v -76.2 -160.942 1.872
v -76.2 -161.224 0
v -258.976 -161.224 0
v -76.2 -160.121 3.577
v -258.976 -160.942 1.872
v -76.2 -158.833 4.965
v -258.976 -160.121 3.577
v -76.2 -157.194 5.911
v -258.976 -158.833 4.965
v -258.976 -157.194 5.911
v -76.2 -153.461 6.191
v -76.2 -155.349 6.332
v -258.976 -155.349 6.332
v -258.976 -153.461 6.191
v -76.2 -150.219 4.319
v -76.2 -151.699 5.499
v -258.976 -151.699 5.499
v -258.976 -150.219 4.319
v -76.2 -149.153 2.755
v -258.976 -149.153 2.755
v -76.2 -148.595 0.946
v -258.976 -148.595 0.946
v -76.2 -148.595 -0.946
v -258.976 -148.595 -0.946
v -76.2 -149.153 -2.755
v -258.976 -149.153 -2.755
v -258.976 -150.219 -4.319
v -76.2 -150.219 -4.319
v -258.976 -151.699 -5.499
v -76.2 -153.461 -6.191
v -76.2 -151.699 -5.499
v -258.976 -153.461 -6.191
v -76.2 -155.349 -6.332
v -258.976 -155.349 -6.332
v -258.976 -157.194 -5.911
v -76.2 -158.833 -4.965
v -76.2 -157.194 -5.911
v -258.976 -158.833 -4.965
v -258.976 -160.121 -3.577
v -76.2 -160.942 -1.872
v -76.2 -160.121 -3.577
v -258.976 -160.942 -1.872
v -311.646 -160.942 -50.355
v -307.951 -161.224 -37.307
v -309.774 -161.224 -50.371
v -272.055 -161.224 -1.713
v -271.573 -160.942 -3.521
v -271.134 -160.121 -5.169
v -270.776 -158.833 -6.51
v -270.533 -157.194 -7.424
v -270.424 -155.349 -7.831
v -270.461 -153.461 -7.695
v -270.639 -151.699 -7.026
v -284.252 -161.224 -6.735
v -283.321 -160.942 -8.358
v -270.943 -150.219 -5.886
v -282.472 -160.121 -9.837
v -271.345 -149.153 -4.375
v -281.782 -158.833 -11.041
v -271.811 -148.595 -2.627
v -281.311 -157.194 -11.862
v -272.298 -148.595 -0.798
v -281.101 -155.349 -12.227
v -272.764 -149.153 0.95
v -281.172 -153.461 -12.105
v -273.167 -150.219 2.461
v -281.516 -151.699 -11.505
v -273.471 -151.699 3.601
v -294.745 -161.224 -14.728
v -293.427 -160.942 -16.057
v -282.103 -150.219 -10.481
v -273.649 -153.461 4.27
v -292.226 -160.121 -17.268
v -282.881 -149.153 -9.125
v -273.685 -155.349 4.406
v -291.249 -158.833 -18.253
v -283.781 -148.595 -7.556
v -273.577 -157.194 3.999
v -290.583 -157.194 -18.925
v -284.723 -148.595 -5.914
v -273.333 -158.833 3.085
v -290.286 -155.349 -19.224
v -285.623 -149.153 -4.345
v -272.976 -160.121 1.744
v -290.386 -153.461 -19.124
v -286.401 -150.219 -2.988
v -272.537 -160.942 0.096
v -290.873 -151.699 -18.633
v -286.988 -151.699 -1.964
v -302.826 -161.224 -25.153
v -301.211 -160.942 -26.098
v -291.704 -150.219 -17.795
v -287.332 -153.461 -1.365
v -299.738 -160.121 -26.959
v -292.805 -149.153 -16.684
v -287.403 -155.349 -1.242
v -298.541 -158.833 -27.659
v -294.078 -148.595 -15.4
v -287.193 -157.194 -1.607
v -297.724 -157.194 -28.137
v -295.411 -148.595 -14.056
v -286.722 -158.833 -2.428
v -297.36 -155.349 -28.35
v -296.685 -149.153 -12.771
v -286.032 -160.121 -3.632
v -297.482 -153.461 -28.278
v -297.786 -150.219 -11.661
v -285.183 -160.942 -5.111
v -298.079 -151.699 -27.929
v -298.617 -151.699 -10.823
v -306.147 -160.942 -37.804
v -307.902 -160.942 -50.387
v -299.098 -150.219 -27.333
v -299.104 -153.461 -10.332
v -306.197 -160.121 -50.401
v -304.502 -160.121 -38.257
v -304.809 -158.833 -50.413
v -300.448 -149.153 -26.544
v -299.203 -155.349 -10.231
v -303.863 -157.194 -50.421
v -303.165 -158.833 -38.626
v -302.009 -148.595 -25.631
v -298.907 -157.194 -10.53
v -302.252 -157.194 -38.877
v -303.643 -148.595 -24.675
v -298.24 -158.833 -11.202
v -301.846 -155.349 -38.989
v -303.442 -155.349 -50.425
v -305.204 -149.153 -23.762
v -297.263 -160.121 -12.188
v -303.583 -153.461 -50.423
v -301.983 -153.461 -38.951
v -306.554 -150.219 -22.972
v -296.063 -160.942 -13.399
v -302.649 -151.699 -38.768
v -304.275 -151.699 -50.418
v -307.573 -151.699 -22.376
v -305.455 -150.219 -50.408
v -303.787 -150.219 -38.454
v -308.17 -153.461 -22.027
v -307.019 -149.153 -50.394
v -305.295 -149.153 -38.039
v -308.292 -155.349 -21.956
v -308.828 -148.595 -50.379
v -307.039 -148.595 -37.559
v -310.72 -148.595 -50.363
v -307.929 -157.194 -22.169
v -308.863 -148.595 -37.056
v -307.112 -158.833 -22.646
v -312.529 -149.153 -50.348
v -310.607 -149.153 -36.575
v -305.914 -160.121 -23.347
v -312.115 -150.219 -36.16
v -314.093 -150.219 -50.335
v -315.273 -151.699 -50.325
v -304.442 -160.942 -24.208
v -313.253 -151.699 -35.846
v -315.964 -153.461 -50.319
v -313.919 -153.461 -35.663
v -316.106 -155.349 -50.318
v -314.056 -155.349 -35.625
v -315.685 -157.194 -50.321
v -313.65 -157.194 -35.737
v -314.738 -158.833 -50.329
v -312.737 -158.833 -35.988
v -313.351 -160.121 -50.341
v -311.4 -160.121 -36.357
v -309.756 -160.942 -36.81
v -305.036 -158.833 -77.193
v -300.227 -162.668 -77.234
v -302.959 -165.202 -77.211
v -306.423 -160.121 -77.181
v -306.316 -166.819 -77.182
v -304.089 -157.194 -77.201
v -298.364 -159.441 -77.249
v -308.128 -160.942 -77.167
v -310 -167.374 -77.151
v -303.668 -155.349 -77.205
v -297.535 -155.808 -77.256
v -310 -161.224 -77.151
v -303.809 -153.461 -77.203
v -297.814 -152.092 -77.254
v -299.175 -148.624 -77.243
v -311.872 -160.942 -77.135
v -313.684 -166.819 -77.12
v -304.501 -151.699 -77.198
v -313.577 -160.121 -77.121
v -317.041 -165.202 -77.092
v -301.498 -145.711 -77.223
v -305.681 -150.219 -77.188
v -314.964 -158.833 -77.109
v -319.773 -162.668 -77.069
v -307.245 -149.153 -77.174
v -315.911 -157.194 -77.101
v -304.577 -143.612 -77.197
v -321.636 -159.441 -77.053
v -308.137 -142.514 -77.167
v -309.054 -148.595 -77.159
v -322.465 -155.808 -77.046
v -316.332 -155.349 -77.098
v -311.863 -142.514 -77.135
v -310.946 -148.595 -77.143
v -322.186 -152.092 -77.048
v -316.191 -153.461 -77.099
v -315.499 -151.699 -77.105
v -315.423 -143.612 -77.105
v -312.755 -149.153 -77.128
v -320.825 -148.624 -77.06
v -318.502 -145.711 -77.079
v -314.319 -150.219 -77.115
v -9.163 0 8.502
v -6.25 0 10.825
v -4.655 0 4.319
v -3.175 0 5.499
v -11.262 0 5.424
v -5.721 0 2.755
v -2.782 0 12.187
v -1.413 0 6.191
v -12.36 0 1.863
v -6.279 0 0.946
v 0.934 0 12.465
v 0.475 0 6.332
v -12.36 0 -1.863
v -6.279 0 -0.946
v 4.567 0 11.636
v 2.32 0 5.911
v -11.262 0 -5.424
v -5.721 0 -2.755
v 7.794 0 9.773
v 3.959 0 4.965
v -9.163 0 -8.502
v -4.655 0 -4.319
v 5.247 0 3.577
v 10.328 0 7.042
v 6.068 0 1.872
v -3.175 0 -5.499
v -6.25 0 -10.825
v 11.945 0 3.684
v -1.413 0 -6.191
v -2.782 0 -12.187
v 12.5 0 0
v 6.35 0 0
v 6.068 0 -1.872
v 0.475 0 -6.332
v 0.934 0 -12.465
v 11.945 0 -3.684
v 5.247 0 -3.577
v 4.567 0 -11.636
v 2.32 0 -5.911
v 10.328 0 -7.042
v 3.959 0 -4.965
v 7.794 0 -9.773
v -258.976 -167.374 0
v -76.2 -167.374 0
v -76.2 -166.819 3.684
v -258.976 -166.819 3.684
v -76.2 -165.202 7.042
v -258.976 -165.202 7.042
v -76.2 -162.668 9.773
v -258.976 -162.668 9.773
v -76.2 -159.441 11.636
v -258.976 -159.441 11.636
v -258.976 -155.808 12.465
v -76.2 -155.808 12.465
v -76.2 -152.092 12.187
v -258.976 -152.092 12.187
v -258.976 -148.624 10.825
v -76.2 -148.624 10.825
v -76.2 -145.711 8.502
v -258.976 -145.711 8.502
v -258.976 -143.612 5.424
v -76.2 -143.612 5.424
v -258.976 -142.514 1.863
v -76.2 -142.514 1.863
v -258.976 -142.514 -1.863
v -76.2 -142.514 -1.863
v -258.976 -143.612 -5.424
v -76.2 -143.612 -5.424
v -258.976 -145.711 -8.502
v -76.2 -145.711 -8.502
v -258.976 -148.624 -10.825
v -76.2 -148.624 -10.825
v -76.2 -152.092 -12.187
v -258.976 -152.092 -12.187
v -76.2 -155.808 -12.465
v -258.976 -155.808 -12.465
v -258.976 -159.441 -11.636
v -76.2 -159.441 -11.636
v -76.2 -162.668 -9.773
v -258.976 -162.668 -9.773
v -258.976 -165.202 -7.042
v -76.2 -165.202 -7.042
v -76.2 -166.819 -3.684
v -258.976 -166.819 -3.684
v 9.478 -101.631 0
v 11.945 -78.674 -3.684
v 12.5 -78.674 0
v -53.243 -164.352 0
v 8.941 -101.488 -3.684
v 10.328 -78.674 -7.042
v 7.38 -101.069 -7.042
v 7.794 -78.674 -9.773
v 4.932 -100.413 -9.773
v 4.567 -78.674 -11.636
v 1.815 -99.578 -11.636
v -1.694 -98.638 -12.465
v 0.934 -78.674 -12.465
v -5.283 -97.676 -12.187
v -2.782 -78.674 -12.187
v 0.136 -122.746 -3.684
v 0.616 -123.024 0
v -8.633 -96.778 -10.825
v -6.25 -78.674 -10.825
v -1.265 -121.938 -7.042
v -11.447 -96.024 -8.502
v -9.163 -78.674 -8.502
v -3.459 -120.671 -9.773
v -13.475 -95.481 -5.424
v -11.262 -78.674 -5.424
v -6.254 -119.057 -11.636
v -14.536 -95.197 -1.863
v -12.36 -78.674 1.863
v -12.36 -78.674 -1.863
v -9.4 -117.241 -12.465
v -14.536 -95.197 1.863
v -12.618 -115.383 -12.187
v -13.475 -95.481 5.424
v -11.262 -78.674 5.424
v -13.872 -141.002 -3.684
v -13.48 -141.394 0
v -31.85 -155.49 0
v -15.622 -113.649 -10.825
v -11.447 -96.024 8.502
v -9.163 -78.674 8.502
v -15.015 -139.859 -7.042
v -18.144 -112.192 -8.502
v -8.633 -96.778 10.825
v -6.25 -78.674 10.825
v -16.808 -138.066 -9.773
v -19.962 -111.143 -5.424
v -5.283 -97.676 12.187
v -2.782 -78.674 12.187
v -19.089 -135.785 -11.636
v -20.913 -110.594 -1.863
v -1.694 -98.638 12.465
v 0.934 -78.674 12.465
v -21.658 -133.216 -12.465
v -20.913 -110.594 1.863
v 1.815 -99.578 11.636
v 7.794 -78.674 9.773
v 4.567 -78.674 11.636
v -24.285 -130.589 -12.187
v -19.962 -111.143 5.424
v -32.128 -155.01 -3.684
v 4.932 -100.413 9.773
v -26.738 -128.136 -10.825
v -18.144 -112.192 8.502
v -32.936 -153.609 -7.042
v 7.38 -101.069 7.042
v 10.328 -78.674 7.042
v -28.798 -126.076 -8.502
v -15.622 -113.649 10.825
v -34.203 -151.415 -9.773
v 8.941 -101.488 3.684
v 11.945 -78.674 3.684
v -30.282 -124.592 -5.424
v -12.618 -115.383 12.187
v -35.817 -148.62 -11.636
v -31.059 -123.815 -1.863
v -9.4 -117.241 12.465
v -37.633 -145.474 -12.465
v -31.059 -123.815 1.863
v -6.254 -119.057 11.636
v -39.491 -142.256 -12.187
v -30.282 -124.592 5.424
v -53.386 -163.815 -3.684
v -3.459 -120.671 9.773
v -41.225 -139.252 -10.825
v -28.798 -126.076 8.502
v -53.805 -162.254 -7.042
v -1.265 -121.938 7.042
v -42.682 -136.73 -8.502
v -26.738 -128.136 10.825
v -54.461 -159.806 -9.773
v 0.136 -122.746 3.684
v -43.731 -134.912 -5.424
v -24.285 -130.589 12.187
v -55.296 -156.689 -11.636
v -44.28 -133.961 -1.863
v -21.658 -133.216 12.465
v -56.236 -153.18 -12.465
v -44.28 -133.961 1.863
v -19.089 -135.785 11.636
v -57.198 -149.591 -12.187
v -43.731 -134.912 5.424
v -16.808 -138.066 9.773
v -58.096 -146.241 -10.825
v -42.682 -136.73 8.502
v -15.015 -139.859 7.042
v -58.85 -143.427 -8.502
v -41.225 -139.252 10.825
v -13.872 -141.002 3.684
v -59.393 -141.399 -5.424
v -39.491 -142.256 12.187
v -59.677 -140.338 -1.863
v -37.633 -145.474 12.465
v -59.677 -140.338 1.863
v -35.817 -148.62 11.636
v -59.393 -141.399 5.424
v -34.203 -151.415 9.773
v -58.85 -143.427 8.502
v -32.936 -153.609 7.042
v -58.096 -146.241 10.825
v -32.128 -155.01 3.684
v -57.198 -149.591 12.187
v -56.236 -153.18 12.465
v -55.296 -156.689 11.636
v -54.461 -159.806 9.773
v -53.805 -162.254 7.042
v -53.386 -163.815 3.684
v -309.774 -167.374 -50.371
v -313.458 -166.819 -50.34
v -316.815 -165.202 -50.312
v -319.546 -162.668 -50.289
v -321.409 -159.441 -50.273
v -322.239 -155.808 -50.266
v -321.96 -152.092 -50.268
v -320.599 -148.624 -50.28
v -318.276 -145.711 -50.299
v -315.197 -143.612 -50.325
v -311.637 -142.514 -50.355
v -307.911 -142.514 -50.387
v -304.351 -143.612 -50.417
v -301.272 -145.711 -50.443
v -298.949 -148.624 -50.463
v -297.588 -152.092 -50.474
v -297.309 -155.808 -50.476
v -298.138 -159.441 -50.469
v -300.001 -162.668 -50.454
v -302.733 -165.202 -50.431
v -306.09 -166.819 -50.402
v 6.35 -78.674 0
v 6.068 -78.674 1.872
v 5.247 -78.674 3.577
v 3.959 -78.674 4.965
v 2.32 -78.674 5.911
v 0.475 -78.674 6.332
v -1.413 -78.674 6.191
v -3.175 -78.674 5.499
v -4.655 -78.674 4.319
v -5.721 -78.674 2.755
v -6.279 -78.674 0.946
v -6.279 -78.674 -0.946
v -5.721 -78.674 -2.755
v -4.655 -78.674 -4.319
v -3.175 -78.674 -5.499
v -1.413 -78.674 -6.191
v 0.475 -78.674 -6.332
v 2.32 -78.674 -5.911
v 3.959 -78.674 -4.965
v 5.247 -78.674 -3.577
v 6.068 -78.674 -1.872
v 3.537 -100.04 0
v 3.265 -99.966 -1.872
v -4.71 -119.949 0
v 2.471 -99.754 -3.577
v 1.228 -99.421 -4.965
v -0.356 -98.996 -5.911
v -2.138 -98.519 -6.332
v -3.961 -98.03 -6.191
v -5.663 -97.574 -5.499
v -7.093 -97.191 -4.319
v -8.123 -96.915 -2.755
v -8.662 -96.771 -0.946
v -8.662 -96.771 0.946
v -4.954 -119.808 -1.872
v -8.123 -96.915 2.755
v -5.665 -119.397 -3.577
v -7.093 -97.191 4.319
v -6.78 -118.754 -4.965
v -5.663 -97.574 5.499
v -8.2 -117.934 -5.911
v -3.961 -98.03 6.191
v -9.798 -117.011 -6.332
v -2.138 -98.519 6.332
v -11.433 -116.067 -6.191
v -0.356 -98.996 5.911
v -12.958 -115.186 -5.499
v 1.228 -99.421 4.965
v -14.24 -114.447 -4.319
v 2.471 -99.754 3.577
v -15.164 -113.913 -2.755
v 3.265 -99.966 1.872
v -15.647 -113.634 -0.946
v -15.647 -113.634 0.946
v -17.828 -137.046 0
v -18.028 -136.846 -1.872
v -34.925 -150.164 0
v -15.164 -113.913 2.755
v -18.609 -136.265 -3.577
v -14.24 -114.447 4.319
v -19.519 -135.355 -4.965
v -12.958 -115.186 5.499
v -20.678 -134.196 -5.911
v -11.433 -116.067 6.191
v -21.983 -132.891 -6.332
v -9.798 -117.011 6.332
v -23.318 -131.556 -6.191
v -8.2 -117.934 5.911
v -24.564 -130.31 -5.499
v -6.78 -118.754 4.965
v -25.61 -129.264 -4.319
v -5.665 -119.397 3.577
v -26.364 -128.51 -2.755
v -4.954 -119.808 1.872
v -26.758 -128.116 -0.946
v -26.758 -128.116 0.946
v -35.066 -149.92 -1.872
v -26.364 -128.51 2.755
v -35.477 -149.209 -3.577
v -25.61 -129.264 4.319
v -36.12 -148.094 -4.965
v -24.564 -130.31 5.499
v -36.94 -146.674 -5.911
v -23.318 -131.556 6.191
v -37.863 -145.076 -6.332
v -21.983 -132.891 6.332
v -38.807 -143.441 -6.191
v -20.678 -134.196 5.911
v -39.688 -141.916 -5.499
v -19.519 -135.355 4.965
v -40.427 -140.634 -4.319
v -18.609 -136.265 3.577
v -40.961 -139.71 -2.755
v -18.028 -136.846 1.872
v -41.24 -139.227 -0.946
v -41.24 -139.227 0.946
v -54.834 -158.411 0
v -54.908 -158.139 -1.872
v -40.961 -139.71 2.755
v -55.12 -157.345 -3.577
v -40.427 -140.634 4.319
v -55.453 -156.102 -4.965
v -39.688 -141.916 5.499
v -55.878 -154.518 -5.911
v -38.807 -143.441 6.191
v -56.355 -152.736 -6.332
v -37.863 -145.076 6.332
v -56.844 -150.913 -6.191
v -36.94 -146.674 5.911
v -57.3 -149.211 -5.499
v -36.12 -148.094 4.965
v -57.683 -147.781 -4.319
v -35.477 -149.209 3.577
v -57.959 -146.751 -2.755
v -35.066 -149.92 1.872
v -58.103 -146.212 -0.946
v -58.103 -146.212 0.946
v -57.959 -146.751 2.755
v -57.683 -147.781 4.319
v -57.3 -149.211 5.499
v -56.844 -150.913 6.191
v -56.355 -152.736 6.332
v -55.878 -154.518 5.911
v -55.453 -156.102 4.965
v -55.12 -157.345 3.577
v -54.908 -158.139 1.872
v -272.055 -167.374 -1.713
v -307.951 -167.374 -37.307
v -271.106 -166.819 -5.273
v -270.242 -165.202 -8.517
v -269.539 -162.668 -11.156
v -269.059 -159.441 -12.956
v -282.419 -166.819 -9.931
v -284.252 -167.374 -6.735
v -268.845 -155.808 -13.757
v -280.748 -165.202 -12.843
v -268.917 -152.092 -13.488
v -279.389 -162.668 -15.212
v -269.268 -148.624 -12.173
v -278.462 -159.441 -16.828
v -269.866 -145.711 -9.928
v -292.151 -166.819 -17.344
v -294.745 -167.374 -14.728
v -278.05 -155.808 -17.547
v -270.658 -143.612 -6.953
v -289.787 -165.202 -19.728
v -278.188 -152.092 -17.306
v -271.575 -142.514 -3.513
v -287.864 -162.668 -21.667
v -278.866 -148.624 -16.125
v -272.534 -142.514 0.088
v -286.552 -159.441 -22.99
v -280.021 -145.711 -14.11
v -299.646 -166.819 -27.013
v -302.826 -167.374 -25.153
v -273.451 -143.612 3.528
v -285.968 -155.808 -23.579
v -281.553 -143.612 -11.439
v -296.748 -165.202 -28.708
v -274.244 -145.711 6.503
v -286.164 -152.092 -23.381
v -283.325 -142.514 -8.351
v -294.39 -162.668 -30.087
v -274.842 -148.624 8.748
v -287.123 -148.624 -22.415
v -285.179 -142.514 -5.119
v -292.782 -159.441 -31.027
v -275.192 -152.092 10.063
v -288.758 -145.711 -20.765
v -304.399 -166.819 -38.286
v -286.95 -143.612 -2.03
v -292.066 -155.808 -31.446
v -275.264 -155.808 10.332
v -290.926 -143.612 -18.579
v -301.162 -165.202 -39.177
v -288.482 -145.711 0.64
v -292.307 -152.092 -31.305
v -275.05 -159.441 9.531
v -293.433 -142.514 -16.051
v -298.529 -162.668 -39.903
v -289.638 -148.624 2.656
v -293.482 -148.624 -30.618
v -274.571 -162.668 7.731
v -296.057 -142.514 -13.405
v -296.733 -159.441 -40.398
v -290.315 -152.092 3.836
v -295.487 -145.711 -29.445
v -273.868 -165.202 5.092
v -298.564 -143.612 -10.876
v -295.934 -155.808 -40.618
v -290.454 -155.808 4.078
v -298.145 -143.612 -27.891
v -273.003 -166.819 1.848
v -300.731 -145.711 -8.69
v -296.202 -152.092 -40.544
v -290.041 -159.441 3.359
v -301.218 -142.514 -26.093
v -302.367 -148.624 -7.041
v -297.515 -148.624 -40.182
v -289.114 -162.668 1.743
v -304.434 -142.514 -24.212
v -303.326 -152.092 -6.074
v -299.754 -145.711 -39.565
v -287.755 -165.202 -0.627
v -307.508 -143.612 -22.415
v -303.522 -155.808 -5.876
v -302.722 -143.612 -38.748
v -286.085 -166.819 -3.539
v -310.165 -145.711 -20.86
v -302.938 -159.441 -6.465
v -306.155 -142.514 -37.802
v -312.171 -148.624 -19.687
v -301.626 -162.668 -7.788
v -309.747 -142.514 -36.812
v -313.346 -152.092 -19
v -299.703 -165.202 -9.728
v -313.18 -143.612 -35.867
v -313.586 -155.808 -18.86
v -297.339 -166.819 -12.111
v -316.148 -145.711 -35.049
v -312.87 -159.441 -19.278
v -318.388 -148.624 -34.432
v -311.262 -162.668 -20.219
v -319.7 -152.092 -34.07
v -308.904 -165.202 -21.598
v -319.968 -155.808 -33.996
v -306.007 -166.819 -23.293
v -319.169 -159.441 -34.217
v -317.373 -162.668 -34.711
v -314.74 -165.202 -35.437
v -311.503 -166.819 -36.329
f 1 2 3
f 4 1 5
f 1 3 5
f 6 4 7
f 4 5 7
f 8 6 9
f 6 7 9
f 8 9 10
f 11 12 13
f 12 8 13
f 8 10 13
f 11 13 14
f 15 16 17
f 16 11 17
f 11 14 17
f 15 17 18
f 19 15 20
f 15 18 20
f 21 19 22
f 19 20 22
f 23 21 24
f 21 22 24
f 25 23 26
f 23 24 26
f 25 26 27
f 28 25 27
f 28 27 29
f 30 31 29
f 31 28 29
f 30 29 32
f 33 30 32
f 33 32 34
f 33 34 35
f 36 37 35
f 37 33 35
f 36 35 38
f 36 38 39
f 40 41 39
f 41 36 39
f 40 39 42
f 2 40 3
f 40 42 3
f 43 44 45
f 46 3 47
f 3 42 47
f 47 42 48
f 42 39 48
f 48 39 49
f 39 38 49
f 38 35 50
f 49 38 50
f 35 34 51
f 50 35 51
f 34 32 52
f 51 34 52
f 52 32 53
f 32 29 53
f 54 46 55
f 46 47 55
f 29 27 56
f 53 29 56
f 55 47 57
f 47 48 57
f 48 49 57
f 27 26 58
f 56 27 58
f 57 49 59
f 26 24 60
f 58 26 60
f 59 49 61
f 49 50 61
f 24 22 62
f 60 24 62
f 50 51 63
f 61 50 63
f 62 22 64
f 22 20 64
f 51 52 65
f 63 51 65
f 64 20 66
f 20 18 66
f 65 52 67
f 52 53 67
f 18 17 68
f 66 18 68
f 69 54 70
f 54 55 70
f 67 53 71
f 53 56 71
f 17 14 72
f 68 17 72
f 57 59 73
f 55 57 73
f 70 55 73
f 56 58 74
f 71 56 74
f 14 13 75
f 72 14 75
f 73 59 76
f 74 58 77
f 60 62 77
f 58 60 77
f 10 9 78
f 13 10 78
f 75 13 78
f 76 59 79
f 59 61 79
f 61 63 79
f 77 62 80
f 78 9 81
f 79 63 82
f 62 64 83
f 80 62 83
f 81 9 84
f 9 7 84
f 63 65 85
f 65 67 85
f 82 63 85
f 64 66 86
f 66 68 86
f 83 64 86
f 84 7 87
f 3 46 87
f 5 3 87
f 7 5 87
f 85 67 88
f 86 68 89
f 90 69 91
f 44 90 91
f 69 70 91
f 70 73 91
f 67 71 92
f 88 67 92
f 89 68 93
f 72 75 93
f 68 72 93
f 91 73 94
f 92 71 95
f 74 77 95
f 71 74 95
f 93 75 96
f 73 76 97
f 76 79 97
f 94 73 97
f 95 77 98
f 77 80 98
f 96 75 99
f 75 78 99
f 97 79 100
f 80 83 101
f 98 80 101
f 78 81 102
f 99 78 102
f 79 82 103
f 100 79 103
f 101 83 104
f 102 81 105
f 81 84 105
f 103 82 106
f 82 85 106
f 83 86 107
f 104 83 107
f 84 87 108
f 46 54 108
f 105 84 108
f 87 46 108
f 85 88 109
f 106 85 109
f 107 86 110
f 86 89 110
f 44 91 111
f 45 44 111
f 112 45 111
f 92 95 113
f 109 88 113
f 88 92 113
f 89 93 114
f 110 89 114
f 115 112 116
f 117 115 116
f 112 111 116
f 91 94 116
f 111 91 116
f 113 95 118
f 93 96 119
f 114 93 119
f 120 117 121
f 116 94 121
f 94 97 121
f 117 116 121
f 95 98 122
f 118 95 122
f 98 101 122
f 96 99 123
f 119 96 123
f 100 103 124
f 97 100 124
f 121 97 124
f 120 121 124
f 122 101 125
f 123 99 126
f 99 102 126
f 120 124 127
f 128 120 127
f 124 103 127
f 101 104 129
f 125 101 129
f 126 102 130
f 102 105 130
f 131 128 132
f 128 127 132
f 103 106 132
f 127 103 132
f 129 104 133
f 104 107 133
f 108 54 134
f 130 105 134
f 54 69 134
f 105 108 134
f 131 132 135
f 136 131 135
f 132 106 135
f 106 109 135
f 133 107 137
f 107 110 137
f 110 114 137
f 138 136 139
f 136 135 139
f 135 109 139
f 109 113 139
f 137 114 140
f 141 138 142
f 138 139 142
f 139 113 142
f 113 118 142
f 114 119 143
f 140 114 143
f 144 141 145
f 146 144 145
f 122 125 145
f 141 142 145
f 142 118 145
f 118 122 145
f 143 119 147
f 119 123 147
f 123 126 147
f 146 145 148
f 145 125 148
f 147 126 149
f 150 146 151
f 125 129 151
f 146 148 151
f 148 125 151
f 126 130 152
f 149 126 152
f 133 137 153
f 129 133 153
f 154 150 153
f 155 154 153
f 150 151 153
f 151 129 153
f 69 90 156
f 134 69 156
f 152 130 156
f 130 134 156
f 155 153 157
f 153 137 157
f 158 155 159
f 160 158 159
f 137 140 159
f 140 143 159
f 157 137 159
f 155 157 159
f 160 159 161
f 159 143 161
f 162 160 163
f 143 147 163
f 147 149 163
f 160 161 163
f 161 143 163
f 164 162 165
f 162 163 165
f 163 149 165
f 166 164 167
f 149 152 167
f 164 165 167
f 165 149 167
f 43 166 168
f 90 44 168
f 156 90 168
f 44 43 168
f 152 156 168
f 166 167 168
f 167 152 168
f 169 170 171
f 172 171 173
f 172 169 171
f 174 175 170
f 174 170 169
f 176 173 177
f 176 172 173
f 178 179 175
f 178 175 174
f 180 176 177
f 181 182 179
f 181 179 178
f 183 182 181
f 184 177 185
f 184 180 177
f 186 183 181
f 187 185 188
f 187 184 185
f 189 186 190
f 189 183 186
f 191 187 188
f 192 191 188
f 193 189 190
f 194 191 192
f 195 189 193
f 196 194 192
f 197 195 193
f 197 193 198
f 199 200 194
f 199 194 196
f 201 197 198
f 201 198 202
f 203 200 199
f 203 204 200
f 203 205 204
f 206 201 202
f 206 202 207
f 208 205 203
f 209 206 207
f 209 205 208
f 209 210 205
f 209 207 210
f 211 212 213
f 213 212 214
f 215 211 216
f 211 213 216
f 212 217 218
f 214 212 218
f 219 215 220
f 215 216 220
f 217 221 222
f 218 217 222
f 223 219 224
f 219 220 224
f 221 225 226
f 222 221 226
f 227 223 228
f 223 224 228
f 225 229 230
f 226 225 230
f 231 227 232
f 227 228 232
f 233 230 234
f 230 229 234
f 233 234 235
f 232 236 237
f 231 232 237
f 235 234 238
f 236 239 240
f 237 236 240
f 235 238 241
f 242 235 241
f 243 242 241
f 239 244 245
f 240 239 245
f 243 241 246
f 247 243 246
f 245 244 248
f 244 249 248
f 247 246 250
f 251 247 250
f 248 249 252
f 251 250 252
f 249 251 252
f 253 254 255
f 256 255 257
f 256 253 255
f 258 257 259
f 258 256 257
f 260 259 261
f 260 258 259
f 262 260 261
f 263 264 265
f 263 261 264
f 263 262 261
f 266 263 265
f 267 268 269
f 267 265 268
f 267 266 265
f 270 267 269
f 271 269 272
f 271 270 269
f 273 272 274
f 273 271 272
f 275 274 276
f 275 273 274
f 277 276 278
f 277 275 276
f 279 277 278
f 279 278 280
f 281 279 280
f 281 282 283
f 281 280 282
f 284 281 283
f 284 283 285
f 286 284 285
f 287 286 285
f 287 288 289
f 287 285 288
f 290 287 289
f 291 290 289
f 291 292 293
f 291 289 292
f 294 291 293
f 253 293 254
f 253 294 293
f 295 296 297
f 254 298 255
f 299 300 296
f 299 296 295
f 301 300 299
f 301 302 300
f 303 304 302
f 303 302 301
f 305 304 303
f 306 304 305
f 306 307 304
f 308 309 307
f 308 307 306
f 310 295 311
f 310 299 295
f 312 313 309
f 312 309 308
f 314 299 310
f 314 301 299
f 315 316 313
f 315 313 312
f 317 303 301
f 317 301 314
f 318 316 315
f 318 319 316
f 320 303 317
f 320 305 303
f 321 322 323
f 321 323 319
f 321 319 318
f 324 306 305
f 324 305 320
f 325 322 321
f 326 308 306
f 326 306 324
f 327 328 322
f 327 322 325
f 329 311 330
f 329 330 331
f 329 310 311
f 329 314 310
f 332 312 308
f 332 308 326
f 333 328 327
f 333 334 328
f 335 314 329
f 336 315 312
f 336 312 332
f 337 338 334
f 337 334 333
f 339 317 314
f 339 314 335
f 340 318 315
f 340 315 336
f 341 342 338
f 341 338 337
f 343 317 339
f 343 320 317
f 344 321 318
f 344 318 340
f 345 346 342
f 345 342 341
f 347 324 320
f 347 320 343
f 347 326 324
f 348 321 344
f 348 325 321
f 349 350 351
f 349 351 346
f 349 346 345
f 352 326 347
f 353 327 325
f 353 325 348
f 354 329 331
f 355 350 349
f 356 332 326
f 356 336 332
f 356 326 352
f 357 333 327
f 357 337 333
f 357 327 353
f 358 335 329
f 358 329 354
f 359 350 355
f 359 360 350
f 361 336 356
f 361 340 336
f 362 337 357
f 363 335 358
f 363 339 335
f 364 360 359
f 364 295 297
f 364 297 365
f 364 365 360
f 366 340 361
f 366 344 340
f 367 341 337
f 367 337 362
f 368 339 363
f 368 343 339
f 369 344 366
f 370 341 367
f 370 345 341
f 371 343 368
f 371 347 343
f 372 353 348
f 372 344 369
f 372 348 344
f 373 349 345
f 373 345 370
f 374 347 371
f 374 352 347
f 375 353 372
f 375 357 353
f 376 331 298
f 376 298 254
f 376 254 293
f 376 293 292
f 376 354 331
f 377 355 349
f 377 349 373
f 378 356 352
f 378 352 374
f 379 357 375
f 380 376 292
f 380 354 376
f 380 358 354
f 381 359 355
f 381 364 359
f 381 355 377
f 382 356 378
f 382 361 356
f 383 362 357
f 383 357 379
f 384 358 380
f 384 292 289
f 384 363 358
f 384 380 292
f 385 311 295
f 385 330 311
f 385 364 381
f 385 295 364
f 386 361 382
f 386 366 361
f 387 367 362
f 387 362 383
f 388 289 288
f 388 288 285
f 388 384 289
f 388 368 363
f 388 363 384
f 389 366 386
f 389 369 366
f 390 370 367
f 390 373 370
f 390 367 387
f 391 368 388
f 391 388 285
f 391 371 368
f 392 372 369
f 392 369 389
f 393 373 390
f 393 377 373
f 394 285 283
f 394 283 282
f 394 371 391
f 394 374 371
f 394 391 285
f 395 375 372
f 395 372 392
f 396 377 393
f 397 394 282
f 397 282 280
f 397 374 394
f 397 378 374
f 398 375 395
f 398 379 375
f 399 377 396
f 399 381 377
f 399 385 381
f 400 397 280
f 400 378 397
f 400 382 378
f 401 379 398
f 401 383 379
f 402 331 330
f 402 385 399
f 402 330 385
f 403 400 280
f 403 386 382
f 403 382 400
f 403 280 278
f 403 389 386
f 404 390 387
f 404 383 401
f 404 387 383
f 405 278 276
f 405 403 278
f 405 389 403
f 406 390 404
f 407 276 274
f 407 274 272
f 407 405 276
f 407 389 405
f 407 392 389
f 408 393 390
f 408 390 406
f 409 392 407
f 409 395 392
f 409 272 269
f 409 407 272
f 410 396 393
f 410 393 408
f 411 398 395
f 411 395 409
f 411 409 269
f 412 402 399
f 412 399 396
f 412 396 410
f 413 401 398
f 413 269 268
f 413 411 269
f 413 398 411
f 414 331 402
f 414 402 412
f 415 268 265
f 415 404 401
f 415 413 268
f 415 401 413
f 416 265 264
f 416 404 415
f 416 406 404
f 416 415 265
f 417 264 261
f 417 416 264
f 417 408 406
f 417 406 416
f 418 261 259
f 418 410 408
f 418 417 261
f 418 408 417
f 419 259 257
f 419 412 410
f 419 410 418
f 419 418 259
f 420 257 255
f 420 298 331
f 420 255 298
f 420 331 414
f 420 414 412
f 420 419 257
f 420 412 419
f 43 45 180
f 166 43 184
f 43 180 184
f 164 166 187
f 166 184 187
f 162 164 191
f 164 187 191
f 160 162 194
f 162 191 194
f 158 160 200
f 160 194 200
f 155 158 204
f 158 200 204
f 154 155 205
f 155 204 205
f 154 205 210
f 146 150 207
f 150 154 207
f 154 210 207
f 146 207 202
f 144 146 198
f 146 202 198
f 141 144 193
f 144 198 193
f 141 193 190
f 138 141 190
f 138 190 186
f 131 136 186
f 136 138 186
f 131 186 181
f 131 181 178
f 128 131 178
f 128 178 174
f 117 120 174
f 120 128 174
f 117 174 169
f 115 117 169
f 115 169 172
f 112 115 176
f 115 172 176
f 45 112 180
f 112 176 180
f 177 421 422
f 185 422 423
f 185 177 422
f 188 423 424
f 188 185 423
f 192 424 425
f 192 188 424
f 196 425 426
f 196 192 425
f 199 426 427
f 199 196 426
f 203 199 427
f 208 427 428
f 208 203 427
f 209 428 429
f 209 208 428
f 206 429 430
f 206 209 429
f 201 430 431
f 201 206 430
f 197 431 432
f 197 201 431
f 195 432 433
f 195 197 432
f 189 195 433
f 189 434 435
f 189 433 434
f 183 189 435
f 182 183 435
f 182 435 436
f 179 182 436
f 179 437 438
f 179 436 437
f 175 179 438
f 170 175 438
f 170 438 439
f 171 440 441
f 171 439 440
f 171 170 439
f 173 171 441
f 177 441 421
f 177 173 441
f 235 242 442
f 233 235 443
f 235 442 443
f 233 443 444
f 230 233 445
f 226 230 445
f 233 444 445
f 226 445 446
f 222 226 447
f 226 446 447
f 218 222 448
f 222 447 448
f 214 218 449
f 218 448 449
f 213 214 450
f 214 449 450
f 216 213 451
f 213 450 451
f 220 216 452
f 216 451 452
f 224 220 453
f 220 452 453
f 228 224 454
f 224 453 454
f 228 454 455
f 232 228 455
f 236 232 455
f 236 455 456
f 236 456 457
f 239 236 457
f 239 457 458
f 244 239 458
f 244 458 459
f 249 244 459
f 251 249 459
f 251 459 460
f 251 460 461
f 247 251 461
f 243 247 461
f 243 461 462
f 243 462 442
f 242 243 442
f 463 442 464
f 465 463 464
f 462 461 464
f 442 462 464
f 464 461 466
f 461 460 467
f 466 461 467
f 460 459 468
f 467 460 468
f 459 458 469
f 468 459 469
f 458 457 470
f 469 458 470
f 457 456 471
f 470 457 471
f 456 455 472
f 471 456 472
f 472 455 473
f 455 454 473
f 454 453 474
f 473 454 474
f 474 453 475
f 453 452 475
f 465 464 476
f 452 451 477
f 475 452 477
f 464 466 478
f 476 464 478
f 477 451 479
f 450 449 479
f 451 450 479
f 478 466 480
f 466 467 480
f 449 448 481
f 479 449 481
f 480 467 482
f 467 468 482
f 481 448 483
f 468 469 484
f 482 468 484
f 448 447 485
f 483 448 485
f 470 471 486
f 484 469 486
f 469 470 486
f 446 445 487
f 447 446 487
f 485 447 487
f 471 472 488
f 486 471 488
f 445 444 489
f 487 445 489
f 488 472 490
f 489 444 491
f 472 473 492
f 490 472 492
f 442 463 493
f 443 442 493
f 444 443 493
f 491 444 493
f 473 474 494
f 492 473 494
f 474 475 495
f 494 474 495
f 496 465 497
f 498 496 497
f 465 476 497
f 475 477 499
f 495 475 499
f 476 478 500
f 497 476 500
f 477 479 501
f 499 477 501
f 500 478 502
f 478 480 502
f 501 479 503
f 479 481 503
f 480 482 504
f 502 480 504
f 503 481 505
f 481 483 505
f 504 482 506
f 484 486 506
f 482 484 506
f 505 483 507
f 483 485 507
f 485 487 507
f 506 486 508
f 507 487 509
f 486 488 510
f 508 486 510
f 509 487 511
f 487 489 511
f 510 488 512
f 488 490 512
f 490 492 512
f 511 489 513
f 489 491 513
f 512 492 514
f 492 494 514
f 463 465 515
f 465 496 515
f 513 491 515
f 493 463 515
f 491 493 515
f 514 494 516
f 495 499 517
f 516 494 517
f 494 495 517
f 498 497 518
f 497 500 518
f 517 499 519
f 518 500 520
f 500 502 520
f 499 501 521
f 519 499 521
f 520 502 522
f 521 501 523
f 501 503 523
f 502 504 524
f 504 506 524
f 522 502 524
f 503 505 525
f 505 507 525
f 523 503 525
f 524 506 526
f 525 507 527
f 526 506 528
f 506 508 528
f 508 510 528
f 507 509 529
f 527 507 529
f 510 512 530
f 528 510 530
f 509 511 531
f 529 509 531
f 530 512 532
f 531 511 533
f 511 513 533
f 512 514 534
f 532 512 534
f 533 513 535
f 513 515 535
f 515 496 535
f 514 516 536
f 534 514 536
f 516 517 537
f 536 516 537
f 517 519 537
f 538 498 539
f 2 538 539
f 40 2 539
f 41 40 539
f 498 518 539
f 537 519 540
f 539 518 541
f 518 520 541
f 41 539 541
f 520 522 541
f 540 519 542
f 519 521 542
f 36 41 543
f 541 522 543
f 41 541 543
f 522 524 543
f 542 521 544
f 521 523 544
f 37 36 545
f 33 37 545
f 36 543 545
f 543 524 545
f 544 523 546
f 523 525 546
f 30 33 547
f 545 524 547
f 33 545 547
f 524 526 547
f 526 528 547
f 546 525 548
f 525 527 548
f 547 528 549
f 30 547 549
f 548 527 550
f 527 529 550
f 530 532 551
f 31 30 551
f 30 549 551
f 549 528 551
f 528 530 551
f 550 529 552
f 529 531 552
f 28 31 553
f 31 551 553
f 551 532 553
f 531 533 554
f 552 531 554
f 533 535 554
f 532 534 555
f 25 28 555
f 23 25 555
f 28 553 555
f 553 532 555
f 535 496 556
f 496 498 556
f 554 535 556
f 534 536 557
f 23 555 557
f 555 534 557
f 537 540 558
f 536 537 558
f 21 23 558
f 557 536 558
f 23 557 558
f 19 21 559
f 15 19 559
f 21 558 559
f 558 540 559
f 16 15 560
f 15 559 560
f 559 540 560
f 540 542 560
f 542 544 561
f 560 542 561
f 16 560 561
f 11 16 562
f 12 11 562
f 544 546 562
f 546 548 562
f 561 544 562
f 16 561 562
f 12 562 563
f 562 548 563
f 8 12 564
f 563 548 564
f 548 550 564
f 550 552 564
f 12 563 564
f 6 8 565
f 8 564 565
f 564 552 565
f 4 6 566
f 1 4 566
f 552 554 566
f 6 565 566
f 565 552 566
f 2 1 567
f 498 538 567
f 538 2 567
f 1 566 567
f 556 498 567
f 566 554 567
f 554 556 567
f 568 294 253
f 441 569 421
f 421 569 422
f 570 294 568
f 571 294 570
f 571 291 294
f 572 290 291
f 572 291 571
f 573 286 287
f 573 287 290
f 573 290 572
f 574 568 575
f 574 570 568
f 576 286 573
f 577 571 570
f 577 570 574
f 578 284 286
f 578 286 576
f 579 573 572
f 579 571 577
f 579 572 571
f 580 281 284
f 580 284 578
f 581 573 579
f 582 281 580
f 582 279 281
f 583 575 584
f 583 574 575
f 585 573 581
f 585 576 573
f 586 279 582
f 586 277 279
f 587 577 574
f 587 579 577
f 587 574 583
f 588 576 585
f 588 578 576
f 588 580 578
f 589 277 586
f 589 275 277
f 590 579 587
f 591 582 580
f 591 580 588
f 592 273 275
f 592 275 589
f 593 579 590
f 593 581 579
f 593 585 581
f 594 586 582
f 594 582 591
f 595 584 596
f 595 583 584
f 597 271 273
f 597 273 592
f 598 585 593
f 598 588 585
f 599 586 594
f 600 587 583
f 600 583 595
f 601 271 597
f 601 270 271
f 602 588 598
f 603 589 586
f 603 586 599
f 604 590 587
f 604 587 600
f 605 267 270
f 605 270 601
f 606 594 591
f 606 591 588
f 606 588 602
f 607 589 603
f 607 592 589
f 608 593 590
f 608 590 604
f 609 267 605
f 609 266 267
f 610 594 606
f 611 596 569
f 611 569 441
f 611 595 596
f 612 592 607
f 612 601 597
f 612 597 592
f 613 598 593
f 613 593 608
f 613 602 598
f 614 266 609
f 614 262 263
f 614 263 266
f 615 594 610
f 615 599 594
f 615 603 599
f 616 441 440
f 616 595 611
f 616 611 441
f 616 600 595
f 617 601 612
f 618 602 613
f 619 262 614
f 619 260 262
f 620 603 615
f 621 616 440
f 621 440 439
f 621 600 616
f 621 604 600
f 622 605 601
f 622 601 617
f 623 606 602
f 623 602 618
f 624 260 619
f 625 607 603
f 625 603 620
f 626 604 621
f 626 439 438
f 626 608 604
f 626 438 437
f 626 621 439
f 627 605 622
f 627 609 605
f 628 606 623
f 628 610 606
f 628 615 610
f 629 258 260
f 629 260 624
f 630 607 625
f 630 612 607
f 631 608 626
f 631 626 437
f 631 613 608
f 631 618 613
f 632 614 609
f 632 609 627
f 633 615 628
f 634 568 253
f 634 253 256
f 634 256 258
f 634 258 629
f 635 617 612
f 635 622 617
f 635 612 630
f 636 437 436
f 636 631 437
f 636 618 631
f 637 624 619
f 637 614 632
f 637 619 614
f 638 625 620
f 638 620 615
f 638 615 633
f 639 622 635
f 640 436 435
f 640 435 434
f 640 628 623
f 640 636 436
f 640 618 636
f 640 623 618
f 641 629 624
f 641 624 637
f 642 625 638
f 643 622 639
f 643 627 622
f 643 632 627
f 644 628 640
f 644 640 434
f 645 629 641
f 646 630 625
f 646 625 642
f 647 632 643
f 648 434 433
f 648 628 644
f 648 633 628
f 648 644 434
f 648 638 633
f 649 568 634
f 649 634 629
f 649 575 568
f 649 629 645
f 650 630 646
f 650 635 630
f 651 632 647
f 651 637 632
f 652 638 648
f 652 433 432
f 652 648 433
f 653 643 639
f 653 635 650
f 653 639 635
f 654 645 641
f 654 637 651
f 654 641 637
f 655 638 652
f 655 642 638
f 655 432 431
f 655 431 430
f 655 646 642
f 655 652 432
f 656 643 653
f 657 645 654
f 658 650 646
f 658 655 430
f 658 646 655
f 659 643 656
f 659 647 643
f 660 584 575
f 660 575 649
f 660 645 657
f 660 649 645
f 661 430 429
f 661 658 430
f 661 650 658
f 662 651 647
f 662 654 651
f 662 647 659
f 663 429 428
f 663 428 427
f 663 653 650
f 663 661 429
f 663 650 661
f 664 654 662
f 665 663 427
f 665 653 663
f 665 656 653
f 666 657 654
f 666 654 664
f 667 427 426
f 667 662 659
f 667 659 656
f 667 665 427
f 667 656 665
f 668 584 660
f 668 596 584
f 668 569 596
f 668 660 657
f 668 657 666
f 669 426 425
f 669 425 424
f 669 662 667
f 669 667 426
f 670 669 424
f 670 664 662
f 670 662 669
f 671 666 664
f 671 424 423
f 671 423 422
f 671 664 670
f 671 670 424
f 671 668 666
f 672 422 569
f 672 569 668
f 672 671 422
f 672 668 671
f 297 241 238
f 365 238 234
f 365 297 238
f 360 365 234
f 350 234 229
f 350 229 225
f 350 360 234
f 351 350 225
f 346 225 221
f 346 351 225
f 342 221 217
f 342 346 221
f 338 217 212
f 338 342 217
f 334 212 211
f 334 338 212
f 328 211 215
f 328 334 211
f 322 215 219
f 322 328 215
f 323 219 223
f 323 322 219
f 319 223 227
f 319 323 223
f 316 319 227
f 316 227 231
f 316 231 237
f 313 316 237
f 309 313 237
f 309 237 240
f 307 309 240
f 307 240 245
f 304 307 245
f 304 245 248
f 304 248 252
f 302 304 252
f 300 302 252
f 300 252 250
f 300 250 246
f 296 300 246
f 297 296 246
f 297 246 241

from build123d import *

# Parameters (mm, degrees)
F0_R   = 12.5
F0_R_2 = 6.35


with BuildPart() as f4:
    # F4: sweep along a path in F1, F3
    with BuildLine(Plane.XY) as f4_path:
        Line((0, 0), (0, -78.674))
        ThreePointArc((0, -78.674), (-22.3184632736, -132.5555367264), (-76.2, -154.874))
        Line((-76.2, -154.874), (-235.882, -154.874))
    with BuildLine(Plane.XZ.offset(154.874)) as f4_path_2:
        Line((-235.882, 0), (-258.9757317515, 0))
        ThreePointArc((-258.9757317515, 0), (-294.7448168404, -14.7276760951), (-309.7739216377, -50.371159374))
        Line((-309.7739216377, -50.371159374), (-310, -77.1512051091))
    # F0 (on Front) → F4 (sweep)
    with BuildSketch(Plane.XZ):
        Circle(F0_R)
        Circle(F0_R_2, mode=Mode.SUBTRACT)
    sweep(path=f4_path.line + f4_path_2.line)


solid = f4.part
